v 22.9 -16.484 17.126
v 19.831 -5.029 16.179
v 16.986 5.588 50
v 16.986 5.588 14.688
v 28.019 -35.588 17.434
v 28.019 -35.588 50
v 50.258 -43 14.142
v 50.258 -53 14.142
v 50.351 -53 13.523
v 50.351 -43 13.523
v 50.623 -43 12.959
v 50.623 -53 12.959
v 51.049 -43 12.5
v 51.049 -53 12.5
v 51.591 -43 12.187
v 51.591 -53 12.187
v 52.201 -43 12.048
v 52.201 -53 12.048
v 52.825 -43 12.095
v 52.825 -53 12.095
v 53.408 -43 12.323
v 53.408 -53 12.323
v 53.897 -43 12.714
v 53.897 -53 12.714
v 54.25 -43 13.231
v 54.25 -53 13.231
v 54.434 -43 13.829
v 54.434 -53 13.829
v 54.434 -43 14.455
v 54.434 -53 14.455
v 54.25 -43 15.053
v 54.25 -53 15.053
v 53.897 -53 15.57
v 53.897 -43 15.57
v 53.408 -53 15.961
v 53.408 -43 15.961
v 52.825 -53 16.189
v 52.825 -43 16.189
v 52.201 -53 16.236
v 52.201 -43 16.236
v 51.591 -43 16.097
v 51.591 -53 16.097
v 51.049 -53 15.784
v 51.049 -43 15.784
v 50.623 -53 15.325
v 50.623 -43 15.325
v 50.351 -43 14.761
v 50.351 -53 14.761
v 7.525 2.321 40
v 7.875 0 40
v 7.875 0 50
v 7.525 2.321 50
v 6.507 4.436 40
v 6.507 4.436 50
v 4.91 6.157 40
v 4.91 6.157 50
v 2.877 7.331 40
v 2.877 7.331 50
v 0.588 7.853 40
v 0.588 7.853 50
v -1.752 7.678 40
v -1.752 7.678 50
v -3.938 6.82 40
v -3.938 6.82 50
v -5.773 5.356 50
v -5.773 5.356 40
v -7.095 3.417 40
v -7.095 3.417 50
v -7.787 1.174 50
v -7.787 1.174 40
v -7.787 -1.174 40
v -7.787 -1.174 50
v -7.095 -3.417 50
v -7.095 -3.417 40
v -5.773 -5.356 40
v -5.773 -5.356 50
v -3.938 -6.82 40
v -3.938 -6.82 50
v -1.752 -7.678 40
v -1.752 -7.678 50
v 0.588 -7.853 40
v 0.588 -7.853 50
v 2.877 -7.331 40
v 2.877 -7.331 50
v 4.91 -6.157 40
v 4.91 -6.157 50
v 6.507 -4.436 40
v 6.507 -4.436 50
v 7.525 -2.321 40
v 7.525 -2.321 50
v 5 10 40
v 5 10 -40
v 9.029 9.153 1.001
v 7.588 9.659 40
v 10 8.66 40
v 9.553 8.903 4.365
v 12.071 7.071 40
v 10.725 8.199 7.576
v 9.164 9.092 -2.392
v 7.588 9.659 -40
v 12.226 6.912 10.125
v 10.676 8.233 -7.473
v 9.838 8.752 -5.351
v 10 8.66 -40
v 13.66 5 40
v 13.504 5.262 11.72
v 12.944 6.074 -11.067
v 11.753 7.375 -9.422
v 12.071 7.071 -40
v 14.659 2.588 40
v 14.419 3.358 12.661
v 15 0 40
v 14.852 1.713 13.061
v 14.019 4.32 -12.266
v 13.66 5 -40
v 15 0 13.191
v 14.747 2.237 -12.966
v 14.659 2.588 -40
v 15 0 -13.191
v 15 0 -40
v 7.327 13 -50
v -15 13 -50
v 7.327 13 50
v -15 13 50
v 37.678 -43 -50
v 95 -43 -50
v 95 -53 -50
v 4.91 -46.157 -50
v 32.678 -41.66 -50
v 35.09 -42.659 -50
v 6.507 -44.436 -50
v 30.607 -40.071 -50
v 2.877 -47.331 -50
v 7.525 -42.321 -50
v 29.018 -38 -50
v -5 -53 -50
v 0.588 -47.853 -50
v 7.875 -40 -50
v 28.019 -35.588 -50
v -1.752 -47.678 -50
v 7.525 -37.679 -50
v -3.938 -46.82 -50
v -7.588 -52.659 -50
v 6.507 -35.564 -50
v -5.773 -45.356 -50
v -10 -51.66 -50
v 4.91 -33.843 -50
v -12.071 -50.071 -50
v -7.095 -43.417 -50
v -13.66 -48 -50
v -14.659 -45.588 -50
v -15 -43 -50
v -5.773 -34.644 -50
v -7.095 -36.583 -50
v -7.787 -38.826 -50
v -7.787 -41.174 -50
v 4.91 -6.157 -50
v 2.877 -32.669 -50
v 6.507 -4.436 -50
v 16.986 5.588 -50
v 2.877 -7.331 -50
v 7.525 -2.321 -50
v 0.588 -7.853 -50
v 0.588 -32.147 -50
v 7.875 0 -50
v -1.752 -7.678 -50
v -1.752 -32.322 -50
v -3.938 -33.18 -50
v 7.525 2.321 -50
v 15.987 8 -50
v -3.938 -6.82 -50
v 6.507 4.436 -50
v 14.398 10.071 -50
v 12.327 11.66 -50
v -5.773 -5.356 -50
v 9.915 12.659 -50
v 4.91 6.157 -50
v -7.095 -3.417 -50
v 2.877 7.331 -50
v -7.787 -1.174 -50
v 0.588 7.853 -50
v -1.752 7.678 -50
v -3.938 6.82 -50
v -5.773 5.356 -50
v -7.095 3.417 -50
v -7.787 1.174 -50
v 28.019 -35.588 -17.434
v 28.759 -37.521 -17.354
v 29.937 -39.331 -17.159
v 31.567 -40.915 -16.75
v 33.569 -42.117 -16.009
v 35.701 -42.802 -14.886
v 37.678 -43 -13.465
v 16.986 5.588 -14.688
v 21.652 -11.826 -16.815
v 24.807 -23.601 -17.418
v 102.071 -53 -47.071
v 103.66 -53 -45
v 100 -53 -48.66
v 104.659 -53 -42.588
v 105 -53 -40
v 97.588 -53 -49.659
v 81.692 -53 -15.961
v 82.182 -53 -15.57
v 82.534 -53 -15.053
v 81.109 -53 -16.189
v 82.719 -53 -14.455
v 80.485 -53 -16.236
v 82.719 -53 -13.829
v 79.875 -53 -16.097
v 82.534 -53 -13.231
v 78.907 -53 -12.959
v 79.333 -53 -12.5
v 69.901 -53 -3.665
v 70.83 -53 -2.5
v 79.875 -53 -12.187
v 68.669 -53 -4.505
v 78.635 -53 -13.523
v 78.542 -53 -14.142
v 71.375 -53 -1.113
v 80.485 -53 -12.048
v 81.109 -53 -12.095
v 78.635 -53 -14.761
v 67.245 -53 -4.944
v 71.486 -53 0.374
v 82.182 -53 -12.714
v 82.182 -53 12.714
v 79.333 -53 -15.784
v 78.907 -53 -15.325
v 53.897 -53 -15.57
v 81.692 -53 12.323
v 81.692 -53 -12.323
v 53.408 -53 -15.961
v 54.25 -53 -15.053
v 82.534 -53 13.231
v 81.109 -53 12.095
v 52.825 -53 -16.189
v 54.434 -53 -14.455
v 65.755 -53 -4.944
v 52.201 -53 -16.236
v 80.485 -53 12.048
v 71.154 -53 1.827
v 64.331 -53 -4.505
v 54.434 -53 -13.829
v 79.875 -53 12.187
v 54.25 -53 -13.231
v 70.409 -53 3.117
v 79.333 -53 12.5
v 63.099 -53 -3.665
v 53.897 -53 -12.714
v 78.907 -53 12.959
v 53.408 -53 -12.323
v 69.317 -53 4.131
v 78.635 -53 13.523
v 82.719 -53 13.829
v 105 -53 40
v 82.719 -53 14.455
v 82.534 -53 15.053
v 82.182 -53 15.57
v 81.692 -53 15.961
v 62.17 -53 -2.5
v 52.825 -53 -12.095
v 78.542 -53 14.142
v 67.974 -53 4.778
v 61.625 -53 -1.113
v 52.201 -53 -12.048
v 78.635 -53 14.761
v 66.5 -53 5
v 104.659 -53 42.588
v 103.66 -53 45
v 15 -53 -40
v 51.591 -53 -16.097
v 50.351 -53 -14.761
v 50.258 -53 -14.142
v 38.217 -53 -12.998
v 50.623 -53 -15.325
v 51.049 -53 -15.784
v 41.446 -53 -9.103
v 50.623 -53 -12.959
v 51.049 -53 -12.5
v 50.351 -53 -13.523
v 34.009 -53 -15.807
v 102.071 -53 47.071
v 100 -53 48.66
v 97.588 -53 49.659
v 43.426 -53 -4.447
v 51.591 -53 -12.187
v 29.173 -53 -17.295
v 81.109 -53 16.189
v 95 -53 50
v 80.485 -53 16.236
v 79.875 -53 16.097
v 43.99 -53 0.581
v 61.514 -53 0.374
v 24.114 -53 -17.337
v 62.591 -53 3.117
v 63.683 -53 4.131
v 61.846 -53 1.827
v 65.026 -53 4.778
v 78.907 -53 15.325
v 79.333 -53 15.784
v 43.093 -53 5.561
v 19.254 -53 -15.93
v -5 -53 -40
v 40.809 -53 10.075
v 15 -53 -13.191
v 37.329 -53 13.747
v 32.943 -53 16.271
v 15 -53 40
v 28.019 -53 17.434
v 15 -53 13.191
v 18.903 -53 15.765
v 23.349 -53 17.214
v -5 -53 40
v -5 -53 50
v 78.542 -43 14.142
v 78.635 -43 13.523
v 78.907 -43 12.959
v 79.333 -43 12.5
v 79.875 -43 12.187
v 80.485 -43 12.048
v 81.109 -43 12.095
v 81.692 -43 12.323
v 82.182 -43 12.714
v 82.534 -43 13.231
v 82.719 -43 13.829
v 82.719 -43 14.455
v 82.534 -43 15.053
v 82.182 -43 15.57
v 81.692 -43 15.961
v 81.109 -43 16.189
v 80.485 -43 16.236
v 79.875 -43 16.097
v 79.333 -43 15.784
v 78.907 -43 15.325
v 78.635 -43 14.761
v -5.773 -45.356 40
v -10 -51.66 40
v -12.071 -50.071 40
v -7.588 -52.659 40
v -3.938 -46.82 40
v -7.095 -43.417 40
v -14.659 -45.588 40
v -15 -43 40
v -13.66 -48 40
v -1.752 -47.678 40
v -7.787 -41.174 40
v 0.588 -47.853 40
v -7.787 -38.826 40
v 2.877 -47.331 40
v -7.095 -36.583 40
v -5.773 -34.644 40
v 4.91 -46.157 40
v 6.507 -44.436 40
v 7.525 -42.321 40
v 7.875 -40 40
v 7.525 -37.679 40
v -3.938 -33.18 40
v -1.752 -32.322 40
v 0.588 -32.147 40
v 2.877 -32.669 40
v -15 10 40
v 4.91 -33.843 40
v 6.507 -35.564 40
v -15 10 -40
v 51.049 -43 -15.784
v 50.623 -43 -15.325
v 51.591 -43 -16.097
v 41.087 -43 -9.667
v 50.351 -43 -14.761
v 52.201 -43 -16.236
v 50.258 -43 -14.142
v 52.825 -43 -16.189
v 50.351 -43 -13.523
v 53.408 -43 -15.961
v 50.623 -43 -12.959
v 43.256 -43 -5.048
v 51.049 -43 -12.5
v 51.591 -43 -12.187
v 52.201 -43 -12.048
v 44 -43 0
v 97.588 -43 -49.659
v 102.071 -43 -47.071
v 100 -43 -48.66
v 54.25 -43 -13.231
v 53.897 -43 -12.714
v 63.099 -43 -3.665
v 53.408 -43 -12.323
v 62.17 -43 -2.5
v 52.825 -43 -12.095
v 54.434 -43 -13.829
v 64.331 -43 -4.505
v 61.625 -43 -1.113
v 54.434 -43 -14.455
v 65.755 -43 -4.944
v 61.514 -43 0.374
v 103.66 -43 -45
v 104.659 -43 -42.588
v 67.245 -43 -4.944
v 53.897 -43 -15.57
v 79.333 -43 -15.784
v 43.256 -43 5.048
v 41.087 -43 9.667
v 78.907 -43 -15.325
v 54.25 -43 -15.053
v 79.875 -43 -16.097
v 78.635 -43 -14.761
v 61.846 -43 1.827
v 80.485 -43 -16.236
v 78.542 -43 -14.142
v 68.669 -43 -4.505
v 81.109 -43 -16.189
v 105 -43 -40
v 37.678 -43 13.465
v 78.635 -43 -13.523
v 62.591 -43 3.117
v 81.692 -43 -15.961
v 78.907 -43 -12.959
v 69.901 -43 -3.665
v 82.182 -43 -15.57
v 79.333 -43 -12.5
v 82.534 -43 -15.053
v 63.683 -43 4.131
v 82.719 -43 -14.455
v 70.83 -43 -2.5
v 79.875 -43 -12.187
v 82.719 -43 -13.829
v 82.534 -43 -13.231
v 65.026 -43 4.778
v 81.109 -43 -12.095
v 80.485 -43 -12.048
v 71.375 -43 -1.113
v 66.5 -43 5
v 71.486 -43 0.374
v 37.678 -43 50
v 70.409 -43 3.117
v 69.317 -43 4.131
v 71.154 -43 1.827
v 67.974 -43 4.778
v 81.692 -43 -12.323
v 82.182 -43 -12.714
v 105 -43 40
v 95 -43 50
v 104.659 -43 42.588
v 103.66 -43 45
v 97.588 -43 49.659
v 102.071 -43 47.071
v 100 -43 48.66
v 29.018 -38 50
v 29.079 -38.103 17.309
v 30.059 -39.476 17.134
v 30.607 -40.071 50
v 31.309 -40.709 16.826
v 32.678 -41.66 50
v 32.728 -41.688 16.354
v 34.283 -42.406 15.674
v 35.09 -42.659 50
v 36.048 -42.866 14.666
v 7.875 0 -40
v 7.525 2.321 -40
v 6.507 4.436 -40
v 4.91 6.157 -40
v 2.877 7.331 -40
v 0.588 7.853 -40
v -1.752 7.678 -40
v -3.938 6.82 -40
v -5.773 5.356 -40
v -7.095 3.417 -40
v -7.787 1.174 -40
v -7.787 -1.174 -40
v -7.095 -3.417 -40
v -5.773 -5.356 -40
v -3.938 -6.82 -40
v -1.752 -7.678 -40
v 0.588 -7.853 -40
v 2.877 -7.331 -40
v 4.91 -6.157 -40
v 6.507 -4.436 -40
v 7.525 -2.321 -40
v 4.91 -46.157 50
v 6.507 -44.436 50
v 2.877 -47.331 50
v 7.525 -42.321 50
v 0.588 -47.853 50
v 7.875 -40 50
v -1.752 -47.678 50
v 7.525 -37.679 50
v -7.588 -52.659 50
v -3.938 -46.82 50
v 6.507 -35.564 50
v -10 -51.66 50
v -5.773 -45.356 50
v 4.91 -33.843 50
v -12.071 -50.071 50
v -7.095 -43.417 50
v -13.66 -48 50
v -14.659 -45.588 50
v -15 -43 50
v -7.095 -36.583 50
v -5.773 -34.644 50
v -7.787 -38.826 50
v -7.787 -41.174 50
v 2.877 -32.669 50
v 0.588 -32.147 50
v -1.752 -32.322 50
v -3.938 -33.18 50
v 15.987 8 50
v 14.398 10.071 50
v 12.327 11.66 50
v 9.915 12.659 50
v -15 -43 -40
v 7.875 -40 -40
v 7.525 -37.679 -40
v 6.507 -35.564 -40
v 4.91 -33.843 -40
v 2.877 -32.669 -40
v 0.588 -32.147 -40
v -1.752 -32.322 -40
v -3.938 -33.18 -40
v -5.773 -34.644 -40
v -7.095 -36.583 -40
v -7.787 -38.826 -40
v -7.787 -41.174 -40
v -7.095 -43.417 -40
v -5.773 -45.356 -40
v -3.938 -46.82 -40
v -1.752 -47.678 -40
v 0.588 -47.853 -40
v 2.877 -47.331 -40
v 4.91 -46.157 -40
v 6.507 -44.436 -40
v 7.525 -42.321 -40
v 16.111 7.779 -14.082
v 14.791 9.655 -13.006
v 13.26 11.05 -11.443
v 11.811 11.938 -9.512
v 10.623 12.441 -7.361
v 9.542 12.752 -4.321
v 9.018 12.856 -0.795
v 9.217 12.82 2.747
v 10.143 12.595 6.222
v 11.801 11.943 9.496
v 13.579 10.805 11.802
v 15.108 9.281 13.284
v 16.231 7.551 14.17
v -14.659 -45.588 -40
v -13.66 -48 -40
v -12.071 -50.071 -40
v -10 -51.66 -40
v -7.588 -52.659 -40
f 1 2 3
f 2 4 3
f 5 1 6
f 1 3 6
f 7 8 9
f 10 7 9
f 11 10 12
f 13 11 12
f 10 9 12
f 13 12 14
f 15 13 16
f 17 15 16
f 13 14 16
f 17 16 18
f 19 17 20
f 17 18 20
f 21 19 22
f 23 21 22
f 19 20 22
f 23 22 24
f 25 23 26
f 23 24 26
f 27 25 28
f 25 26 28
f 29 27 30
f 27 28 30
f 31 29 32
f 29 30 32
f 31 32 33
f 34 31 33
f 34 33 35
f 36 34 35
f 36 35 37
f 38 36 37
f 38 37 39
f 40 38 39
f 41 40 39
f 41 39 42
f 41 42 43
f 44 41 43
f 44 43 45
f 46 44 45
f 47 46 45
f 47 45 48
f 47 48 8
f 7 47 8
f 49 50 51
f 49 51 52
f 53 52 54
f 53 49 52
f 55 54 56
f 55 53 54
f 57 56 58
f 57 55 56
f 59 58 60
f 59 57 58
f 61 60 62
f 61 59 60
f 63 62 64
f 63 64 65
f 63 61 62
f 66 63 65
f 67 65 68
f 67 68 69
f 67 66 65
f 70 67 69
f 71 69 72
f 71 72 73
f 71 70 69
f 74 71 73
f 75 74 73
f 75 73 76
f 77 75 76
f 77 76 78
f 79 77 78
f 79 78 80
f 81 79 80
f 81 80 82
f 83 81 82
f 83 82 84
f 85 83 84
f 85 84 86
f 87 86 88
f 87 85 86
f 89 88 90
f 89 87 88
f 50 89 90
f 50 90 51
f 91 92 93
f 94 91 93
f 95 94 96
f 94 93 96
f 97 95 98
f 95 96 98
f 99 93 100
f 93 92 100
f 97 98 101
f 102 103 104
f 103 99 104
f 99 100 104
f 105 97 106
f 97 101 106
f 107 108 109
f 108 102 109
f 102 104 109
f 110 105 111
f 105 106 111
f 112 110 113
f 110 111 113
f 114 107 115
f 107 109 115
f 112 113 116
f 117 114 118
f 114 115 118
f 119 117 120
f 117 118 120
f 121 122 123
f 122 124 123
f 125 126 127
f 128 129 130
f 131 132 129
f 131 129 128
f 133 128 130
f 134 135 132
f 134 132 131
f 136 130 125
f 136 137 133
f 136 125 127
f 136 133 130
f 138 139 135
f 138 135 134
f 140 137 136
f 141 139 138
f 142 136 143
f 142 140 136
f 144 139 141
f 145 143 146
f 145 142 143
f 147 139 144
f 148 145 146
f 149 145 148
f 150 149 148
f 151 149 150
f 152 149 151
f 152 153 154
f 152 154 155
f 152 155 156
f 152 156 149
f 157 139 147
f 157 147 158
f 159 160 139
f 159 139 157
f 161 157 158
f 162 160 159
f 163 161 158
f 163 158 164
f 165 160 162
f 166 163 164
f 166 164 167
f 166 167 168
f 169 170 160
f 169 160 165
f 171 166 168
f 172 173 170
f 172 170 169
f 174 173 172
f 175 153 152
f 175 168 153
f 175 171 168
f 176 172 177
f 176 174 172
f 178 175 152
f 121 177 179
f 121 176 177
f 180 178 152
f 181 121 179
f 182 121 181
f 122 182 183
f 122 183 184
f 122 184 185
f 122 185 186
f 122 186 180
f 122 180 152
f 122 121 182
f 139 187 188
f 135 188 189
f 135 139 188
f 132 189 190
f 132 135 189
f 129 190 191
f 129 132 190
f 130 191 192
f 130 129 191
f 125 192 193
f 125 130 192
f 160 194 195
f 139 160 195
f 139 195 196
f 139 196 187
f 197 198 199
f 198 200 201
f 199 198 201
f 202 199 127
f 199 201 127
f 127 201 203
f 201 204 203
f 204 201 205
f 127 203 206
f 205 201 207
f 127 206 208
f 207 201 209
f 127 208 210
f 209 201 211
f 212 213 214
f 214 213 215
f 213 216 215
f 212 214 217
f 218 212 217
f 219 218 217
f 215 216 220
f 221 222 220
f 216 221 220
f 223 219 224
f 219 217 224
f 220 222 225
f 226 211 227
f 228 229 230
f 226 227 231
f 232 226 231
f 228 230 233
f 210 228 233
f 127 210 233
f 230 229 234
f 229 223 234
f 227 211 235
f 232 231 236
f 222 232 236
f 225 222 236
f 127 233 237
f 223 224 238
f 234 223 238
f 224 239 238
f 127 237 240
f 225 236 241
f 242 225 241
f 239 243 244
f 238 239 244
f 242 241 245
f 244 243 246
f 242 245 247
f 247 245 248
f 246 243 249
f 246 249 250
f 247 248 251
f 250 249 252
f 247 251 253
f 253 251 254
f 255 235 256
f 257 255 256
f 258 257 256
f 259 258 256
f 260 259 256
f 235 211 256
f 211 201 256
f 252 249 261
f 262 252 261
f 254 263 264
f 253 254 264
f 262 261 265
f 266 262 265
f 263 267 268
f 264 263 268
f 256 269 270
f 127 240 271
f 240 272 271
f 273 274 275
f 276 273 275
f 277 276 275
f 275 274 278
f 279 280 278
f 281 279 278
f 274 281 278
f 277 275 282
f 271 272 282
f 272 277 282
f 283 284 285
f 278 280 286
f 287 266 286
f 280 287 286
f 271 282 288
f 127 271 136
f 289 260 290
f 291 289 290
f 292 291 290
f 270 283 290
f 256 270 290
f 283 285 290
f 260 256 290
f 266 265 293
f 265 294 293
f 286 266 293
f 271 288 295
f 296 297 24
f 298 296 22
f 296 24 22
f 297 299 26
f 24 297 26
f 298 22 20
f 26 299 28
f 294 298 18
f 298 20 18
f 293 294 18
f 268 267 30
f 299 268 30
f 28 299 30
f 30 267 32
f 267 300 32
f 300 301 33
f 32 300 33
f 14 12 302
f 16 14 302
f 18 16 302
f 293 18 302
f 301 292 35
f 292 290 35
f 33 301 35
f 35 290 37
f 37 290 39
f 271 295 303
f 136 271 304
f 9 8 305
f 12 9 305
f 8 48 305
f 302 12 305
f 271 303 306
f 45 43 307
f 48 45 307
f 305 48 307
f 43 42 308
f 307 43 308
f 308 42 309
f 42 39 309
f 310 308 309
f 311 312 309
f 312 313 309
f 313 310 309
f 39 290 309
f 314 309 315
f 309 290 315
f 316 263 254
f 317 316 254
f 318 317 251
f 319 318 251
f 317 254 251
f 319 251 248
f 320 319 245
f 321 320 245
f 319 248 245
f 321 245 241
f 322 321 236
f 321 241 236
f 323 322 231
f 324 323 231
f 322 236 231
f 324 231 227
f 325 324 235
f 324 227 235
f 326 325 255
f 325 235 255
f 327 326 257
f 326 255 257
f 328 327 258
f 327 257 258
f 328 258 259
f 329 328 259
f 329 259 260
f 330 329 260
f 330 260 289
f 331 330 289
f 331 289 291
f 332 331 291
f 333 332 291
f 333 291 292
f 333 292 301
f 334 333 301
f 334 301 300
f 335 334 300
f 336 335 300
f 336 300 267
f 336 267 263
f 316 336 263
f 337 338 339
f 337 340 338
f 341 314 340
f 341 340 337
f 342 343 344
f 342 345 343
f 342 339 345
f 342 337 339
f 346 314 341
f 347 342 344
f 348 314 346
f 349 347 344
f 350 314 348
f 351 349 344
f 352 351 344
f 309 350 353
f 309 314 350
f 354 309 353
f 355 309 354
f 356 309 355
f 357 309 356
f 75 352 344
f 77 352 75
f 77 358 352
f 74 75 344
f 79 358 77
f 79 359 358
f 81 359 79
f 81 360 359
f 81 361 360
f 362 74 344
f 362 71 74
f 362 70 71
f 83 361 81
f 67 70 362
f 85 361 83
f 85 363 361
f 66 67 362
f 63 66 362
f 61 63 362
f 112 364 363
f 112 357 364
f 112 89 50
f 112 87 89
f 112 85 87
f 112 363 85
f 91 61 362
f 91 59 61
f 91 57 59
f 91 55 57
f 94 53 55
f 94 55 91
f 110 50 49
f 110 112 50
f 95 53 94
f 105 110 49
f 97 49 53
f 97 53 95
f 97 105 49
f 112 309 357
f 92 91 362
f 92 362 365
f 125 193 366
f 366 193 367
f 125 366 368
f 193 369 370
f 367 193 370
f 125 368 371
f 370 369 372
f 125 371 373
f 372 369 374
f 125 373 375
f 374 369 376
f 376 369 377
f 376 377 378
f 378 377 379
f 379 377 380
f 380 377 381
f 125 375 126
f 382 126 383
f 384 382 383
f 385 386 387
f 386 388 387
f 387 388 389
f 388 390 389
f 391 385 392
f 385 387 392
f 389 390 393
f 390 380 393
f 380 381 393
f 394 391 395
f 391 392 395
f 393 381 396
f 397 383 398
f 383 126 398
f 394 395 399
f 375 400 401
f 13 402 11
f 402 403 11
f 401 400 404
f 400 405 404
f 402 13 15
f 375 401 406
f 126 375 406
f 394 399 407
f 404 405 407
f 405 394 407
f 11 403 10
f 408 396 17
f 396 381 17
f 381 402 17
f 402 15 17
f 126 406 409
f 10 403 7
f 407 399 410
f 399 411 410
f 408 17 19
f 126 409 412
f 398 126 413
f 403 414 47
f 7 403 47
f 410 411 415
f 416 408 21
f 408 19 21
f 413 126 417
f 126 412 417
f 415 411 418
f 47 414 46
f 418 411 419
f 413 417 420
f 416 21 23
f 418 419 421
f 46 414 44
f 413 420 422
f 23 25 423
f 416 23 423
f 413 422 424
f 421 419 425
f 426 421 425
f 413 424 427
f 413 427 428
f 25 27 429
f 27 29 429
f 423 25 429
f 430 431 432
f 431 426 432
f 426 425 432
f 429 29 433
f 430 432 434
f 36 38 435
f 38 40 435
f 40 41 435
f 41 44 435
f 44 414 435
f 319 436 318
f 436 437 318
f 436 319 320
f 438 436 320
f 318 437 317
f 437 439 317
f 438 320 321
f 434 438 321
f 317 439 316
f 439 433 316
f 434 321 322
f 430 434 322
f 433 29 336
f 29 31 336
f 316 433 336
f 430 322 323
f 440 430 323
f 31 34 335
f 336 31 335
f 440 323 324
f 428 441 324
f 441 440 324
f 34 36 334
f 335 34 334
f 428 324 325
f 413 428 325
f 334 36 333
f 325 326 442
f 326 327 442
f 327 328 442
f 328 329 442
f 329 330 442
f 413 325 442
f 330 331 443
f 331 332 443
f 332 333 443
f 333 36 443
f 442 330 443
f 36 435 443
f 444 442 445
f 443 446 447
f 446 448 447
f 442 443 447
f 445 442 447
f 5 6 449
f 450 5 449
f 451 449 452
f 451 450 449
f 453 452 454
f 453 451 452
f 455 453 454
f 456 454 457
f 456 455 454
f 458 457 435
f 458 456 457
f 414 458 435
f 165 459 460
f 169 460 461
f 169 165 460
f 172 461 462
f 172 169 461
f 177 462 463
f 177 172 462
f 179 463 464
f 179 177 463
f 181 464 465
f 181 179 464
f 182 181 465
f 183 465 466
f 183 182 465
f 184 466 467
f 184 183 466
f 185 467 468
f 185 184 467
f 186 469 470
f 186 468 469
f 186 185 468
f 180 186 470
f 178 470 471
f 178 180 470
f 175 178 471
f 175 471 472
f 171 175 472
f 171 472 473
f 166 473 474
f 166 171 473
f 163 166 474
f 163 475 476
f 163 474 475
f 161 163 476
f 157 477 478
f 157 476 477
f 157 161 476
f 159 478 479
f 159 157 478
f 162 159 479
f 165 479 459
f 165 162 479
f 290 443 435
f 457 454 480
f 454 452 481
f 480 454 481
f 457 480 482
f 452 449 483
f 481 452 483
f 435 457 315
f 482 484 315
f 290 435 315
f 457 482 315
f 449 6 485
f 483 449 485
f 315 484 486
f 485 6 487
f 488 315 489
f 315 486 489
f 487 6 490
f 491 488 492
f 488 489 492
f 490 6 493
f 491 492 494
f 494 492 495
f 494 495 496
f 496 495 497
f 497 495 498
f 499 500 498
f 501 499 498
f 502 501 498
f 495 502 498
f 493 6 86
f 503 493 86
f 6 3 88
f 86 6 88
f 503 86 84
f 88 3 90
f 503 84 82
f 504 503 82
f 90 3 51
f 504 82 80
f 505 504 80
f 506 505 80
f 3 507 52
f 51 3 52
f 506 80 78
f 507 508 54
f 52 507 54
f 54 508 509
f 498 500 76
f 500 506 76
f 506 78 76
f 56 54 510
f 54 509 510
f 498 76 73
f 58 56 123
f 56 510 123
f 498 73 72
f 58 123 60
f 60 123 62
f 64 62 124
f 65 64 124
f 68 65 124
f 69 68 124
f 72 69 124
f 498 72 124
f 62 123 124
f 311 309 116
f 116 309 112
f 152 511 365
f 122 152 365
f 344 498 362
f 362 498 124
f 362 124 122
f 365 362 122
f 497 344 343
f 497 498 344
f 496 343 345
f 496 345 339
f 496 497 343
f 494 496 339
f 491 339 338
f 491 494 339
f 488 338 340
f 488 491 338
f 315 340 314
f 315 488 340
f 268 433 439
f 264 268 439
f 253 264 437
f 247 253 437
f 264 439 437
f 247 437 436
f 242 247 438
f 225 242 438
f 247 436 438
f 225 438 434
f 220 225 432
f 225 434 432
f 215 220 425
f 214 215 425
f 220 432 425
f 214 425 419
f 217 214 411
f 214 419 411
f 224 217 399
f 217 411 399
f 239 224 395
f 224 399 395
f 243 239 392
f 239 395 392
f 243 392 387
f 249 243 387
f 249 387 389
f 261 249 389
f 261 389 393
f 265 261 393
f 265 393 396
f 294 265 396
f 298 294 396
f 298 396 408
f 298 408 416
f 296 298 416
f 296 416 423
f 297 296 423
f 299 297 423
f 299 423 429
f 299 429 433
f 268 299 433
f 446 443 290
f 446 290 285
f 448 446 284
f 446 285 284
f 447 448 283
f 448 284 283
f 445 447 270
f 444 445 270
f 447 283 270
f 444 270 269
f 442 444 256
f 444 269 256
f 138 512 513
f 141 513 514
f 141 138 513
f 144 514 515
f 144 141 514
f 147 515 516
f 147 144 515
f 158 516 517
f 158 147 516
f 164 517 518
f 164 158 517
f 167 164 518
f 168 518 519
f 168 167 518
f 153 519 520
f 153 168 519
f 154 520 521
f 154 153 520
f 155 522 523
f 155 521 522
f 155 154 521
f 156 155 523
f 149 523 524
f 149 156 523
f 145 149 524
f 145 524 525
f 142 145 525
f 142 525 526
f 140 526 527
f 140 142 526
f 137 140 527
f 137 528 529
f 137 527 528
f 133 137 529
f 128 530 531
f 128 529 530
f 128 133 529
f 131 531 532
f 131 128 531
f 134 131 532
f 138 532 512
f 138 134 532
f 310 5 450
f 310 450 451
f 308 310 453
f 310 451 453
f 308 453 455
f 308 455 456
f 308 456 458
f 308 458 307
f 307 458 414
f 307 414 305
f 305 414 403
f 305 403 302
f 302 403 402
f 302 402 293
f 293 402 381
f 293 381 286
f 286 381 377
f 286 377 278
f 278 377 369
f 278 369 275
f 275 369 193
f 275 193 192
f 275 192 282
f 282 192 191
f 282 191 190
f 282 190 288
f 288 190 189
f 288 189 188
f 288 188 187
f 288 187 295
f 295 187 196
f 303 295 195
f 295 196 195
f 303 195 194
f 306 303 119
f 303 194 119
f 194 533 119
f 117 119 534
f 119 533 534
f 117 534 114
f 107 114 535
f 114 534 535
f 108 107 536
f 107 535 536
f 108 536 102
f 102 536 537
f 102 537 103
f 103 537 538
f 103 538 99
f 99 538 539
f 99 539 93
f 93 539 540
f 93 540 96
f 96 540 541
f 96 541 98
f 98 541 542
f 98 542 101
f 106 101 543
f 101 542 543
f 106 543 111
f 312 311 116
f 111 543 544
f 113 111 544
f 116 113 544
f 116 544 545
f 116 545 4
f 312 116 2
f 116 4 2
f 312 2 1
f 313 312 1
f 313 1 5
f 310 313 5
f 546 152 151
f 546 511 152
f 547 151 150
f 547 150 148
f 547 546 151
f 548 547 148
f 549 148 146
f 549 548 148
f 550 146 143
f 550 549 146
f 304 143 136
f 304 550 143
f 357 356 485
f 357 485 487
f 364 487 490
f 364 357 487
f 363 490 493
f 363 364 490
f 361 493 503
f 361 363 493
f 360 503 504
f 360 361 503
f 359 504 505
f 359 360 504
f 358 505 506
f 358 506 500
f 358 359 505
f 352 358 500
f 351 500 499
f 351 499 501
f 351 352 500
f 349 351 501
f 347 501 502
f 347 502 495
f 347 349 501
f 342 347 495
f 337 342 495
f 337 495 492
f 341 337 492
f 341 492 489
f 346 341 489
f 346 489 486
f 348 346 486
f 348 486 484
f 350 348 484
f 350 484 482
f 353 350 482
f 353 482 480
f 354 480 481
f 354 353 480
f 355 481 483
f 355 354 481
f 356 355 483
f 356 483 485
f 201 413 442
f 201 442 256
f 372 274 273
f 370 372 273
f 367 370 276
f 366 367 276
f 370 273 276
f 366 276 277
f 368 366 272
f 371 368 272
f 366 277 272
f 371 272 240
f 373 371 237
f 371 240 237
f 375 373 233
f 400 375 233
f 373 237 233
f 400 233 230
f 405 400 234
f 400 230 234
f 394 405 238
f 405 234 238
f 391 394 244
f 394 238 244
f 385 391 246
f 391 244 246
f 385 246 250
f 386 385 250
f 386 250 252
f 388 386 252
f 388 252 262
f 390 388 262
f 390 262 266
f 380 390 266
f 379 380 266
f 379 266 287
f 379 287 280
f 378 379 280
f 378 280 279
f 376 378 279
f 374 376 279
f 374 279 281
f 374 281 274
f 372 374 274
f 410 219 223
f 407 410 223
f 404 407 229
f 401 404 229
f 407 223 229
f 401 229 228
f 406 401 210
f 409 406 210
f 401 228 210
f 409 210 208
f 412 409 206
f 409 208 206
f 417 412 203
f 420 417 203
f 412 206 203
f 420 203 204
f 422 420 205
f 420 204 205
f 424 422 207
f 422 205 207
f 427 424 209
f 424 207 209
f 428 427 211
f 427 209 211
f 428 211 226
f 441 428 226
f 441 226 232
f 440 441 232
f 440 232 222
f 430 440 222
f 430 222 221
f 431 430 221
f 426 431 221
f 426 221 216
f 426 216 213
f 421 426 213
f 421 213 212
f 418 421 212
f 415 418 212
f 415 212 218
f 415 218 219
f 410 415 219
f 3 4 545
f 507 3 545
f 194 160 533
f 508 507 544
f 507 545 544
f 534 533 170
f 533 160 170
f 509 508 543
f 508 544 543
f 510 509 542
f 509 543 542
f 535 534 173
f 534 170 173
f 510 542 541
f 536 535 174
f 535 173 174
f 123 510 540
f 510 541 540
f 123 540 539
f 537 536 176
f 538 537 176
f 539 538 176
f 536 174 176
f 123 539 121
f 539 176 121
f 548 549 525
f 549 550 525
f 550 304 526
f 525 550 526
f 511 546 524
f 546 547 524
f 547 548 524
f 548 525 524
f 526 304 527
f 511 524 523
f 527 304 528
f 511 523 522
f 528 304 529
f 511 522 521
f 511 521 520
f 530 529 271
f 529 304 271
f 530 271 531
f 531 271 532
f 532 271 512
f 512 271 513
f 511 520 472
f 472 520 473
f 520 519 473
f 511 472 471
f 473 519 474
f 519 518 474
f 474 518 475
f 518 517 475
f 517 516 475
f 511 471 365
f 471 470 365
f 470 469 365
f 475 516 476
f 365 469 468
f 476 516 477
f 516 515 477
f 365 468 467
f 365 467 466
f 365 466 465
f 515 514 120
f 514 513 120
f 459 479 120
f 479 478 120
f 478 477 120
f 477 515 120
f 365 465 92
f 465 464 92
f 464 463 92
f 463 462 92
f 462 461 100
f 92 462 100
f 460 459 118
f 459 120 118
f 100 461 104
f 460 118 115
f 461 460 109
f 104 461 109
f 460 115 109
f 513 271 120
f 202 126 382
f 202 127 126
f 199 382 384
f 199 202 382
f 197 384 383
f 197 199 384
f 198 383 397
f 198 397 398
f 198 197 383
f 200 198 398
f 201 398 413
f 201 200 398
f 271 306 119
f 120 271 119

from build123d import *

# Parameters (mm, degrees)
SKETCH1_W             = 30
SKETCH1_H             = 66
SKETCH1_R             = 7.875
BOSS_EXTRUDE1_DEPTH   = 50
SKETCH2_W             = 80
SKETCH2_H             = 63
CUT_EXTRUDE1_DEPTH    = 79.797208072
BOSS_EXTRUDE2_DEPTH   = 100
SKETCH5_R             = 5
CUT_EXTRUDE2_DEPTH    = 130.077496102
M5X0_8_TAPPED_HOLE1_D = 4.2
FILLET1_R             = 10
SKETCH10_R            = 17.5
CUT_EXTRUDE3_DEPTH    = 134.719856416


with BuildPart() as part:
    # Sketch1 → Boss-Extrude1 (new, symmetric)
    with BuildSketch(Plane.XY):
        with Locations((0, -20)):
            Rectangle(SKETCH1_W, SKETCH1_H)
        Circle(SKETCH1_R, mode=Mode.SUBTRACT)
        with Locations((0, -40)):
            Circle(SKETCH1_R, mode=Mode.SUBTRACT)
    extrude(amount=BOSS_EXTRUDE1_DEPTH, both=True)

    # Sketch2 → Cut-Extrude1 (cut, through all)
    with BuildSketch(Plane(origin=(15, 0, 0), x_dir=(0, 0, -1), z_dir=(1, 0, 0))):
        with Locations((0, -21.5)):
            Rectangle(SKETCH2_W, SKETCH2_H)
    extrude(amount=-CUT_EXTRUDE1_DEPTH, mode=Mode.SUBTRACT)

    # Sketch4 → Boss-Extrude2 (add)
    with BuildSketch(Plane.XY.offset(50)):
        Polygon((15, 13), (30.005154776, -43), (105, -43), (105, -53), (15, -53), align=None)
    extrude(amount=-BOSS_EXTRUDE2_DEPTH)

    # Sketch5 → Cut-Extrude2 (cut, through all)
    with BuildSketch(Plane(origin=(0, -43, 0), x_dir=(1, 0, 0), z_dir=(0, 1, 0))):
        with Locations(Location((66.5, 0, 0), (0, 0, 270))):
            Circle(SKETCH5_R)
    extrude(amount=-CUT_EXTRUDE2_DEPTH, mode=Mode.SUBTRACT)

    # M5x0.8 Tapped Hole1 (through all)
    with Locations(Plane(origin=(0, -43, 0), x_dir=(1, 0, 0), z_dir=(0, 1, 0))):
        with Locations((80.642135624, 14.142135624), (80.642135624, -14.142135624), (52.357864376, 14.142135624), (52.357864376, -14.142135624)):
            Hole(M5X0_8_TAPPED_HOLE1_D / 2)

    # Fillet1
    fillet1_edges = [part.edges().sort_by_distance(p)[0] for p in [
        (15, 13, 0),
        (30.005154776, -43, 0),
        (105, -48, 50),
        (105, -48, -50),
        (-15, -53, -45),
        (-15, -53, 45),
        (15, 10, 0),
    ]]
    fillet(fillet1_edges, radius=FILLET1_R)

    # Sketch10 → Cut-Extrude3 (cut, through all)
    with BuildSketch(Plane(origin=(0, 13, 0), x_dir=(1, 0, 0), z_dir=(0, 1, 0))):
        with Locations(Location((26.5, 0, 0), (0, 0, 274.980086745))):
            Circle(SKETCH10_R)
    extrude(amount=-CUT_EXTRUDE3_DEPTH, mode=Mode.SUBTRACT)


solid = part.part
